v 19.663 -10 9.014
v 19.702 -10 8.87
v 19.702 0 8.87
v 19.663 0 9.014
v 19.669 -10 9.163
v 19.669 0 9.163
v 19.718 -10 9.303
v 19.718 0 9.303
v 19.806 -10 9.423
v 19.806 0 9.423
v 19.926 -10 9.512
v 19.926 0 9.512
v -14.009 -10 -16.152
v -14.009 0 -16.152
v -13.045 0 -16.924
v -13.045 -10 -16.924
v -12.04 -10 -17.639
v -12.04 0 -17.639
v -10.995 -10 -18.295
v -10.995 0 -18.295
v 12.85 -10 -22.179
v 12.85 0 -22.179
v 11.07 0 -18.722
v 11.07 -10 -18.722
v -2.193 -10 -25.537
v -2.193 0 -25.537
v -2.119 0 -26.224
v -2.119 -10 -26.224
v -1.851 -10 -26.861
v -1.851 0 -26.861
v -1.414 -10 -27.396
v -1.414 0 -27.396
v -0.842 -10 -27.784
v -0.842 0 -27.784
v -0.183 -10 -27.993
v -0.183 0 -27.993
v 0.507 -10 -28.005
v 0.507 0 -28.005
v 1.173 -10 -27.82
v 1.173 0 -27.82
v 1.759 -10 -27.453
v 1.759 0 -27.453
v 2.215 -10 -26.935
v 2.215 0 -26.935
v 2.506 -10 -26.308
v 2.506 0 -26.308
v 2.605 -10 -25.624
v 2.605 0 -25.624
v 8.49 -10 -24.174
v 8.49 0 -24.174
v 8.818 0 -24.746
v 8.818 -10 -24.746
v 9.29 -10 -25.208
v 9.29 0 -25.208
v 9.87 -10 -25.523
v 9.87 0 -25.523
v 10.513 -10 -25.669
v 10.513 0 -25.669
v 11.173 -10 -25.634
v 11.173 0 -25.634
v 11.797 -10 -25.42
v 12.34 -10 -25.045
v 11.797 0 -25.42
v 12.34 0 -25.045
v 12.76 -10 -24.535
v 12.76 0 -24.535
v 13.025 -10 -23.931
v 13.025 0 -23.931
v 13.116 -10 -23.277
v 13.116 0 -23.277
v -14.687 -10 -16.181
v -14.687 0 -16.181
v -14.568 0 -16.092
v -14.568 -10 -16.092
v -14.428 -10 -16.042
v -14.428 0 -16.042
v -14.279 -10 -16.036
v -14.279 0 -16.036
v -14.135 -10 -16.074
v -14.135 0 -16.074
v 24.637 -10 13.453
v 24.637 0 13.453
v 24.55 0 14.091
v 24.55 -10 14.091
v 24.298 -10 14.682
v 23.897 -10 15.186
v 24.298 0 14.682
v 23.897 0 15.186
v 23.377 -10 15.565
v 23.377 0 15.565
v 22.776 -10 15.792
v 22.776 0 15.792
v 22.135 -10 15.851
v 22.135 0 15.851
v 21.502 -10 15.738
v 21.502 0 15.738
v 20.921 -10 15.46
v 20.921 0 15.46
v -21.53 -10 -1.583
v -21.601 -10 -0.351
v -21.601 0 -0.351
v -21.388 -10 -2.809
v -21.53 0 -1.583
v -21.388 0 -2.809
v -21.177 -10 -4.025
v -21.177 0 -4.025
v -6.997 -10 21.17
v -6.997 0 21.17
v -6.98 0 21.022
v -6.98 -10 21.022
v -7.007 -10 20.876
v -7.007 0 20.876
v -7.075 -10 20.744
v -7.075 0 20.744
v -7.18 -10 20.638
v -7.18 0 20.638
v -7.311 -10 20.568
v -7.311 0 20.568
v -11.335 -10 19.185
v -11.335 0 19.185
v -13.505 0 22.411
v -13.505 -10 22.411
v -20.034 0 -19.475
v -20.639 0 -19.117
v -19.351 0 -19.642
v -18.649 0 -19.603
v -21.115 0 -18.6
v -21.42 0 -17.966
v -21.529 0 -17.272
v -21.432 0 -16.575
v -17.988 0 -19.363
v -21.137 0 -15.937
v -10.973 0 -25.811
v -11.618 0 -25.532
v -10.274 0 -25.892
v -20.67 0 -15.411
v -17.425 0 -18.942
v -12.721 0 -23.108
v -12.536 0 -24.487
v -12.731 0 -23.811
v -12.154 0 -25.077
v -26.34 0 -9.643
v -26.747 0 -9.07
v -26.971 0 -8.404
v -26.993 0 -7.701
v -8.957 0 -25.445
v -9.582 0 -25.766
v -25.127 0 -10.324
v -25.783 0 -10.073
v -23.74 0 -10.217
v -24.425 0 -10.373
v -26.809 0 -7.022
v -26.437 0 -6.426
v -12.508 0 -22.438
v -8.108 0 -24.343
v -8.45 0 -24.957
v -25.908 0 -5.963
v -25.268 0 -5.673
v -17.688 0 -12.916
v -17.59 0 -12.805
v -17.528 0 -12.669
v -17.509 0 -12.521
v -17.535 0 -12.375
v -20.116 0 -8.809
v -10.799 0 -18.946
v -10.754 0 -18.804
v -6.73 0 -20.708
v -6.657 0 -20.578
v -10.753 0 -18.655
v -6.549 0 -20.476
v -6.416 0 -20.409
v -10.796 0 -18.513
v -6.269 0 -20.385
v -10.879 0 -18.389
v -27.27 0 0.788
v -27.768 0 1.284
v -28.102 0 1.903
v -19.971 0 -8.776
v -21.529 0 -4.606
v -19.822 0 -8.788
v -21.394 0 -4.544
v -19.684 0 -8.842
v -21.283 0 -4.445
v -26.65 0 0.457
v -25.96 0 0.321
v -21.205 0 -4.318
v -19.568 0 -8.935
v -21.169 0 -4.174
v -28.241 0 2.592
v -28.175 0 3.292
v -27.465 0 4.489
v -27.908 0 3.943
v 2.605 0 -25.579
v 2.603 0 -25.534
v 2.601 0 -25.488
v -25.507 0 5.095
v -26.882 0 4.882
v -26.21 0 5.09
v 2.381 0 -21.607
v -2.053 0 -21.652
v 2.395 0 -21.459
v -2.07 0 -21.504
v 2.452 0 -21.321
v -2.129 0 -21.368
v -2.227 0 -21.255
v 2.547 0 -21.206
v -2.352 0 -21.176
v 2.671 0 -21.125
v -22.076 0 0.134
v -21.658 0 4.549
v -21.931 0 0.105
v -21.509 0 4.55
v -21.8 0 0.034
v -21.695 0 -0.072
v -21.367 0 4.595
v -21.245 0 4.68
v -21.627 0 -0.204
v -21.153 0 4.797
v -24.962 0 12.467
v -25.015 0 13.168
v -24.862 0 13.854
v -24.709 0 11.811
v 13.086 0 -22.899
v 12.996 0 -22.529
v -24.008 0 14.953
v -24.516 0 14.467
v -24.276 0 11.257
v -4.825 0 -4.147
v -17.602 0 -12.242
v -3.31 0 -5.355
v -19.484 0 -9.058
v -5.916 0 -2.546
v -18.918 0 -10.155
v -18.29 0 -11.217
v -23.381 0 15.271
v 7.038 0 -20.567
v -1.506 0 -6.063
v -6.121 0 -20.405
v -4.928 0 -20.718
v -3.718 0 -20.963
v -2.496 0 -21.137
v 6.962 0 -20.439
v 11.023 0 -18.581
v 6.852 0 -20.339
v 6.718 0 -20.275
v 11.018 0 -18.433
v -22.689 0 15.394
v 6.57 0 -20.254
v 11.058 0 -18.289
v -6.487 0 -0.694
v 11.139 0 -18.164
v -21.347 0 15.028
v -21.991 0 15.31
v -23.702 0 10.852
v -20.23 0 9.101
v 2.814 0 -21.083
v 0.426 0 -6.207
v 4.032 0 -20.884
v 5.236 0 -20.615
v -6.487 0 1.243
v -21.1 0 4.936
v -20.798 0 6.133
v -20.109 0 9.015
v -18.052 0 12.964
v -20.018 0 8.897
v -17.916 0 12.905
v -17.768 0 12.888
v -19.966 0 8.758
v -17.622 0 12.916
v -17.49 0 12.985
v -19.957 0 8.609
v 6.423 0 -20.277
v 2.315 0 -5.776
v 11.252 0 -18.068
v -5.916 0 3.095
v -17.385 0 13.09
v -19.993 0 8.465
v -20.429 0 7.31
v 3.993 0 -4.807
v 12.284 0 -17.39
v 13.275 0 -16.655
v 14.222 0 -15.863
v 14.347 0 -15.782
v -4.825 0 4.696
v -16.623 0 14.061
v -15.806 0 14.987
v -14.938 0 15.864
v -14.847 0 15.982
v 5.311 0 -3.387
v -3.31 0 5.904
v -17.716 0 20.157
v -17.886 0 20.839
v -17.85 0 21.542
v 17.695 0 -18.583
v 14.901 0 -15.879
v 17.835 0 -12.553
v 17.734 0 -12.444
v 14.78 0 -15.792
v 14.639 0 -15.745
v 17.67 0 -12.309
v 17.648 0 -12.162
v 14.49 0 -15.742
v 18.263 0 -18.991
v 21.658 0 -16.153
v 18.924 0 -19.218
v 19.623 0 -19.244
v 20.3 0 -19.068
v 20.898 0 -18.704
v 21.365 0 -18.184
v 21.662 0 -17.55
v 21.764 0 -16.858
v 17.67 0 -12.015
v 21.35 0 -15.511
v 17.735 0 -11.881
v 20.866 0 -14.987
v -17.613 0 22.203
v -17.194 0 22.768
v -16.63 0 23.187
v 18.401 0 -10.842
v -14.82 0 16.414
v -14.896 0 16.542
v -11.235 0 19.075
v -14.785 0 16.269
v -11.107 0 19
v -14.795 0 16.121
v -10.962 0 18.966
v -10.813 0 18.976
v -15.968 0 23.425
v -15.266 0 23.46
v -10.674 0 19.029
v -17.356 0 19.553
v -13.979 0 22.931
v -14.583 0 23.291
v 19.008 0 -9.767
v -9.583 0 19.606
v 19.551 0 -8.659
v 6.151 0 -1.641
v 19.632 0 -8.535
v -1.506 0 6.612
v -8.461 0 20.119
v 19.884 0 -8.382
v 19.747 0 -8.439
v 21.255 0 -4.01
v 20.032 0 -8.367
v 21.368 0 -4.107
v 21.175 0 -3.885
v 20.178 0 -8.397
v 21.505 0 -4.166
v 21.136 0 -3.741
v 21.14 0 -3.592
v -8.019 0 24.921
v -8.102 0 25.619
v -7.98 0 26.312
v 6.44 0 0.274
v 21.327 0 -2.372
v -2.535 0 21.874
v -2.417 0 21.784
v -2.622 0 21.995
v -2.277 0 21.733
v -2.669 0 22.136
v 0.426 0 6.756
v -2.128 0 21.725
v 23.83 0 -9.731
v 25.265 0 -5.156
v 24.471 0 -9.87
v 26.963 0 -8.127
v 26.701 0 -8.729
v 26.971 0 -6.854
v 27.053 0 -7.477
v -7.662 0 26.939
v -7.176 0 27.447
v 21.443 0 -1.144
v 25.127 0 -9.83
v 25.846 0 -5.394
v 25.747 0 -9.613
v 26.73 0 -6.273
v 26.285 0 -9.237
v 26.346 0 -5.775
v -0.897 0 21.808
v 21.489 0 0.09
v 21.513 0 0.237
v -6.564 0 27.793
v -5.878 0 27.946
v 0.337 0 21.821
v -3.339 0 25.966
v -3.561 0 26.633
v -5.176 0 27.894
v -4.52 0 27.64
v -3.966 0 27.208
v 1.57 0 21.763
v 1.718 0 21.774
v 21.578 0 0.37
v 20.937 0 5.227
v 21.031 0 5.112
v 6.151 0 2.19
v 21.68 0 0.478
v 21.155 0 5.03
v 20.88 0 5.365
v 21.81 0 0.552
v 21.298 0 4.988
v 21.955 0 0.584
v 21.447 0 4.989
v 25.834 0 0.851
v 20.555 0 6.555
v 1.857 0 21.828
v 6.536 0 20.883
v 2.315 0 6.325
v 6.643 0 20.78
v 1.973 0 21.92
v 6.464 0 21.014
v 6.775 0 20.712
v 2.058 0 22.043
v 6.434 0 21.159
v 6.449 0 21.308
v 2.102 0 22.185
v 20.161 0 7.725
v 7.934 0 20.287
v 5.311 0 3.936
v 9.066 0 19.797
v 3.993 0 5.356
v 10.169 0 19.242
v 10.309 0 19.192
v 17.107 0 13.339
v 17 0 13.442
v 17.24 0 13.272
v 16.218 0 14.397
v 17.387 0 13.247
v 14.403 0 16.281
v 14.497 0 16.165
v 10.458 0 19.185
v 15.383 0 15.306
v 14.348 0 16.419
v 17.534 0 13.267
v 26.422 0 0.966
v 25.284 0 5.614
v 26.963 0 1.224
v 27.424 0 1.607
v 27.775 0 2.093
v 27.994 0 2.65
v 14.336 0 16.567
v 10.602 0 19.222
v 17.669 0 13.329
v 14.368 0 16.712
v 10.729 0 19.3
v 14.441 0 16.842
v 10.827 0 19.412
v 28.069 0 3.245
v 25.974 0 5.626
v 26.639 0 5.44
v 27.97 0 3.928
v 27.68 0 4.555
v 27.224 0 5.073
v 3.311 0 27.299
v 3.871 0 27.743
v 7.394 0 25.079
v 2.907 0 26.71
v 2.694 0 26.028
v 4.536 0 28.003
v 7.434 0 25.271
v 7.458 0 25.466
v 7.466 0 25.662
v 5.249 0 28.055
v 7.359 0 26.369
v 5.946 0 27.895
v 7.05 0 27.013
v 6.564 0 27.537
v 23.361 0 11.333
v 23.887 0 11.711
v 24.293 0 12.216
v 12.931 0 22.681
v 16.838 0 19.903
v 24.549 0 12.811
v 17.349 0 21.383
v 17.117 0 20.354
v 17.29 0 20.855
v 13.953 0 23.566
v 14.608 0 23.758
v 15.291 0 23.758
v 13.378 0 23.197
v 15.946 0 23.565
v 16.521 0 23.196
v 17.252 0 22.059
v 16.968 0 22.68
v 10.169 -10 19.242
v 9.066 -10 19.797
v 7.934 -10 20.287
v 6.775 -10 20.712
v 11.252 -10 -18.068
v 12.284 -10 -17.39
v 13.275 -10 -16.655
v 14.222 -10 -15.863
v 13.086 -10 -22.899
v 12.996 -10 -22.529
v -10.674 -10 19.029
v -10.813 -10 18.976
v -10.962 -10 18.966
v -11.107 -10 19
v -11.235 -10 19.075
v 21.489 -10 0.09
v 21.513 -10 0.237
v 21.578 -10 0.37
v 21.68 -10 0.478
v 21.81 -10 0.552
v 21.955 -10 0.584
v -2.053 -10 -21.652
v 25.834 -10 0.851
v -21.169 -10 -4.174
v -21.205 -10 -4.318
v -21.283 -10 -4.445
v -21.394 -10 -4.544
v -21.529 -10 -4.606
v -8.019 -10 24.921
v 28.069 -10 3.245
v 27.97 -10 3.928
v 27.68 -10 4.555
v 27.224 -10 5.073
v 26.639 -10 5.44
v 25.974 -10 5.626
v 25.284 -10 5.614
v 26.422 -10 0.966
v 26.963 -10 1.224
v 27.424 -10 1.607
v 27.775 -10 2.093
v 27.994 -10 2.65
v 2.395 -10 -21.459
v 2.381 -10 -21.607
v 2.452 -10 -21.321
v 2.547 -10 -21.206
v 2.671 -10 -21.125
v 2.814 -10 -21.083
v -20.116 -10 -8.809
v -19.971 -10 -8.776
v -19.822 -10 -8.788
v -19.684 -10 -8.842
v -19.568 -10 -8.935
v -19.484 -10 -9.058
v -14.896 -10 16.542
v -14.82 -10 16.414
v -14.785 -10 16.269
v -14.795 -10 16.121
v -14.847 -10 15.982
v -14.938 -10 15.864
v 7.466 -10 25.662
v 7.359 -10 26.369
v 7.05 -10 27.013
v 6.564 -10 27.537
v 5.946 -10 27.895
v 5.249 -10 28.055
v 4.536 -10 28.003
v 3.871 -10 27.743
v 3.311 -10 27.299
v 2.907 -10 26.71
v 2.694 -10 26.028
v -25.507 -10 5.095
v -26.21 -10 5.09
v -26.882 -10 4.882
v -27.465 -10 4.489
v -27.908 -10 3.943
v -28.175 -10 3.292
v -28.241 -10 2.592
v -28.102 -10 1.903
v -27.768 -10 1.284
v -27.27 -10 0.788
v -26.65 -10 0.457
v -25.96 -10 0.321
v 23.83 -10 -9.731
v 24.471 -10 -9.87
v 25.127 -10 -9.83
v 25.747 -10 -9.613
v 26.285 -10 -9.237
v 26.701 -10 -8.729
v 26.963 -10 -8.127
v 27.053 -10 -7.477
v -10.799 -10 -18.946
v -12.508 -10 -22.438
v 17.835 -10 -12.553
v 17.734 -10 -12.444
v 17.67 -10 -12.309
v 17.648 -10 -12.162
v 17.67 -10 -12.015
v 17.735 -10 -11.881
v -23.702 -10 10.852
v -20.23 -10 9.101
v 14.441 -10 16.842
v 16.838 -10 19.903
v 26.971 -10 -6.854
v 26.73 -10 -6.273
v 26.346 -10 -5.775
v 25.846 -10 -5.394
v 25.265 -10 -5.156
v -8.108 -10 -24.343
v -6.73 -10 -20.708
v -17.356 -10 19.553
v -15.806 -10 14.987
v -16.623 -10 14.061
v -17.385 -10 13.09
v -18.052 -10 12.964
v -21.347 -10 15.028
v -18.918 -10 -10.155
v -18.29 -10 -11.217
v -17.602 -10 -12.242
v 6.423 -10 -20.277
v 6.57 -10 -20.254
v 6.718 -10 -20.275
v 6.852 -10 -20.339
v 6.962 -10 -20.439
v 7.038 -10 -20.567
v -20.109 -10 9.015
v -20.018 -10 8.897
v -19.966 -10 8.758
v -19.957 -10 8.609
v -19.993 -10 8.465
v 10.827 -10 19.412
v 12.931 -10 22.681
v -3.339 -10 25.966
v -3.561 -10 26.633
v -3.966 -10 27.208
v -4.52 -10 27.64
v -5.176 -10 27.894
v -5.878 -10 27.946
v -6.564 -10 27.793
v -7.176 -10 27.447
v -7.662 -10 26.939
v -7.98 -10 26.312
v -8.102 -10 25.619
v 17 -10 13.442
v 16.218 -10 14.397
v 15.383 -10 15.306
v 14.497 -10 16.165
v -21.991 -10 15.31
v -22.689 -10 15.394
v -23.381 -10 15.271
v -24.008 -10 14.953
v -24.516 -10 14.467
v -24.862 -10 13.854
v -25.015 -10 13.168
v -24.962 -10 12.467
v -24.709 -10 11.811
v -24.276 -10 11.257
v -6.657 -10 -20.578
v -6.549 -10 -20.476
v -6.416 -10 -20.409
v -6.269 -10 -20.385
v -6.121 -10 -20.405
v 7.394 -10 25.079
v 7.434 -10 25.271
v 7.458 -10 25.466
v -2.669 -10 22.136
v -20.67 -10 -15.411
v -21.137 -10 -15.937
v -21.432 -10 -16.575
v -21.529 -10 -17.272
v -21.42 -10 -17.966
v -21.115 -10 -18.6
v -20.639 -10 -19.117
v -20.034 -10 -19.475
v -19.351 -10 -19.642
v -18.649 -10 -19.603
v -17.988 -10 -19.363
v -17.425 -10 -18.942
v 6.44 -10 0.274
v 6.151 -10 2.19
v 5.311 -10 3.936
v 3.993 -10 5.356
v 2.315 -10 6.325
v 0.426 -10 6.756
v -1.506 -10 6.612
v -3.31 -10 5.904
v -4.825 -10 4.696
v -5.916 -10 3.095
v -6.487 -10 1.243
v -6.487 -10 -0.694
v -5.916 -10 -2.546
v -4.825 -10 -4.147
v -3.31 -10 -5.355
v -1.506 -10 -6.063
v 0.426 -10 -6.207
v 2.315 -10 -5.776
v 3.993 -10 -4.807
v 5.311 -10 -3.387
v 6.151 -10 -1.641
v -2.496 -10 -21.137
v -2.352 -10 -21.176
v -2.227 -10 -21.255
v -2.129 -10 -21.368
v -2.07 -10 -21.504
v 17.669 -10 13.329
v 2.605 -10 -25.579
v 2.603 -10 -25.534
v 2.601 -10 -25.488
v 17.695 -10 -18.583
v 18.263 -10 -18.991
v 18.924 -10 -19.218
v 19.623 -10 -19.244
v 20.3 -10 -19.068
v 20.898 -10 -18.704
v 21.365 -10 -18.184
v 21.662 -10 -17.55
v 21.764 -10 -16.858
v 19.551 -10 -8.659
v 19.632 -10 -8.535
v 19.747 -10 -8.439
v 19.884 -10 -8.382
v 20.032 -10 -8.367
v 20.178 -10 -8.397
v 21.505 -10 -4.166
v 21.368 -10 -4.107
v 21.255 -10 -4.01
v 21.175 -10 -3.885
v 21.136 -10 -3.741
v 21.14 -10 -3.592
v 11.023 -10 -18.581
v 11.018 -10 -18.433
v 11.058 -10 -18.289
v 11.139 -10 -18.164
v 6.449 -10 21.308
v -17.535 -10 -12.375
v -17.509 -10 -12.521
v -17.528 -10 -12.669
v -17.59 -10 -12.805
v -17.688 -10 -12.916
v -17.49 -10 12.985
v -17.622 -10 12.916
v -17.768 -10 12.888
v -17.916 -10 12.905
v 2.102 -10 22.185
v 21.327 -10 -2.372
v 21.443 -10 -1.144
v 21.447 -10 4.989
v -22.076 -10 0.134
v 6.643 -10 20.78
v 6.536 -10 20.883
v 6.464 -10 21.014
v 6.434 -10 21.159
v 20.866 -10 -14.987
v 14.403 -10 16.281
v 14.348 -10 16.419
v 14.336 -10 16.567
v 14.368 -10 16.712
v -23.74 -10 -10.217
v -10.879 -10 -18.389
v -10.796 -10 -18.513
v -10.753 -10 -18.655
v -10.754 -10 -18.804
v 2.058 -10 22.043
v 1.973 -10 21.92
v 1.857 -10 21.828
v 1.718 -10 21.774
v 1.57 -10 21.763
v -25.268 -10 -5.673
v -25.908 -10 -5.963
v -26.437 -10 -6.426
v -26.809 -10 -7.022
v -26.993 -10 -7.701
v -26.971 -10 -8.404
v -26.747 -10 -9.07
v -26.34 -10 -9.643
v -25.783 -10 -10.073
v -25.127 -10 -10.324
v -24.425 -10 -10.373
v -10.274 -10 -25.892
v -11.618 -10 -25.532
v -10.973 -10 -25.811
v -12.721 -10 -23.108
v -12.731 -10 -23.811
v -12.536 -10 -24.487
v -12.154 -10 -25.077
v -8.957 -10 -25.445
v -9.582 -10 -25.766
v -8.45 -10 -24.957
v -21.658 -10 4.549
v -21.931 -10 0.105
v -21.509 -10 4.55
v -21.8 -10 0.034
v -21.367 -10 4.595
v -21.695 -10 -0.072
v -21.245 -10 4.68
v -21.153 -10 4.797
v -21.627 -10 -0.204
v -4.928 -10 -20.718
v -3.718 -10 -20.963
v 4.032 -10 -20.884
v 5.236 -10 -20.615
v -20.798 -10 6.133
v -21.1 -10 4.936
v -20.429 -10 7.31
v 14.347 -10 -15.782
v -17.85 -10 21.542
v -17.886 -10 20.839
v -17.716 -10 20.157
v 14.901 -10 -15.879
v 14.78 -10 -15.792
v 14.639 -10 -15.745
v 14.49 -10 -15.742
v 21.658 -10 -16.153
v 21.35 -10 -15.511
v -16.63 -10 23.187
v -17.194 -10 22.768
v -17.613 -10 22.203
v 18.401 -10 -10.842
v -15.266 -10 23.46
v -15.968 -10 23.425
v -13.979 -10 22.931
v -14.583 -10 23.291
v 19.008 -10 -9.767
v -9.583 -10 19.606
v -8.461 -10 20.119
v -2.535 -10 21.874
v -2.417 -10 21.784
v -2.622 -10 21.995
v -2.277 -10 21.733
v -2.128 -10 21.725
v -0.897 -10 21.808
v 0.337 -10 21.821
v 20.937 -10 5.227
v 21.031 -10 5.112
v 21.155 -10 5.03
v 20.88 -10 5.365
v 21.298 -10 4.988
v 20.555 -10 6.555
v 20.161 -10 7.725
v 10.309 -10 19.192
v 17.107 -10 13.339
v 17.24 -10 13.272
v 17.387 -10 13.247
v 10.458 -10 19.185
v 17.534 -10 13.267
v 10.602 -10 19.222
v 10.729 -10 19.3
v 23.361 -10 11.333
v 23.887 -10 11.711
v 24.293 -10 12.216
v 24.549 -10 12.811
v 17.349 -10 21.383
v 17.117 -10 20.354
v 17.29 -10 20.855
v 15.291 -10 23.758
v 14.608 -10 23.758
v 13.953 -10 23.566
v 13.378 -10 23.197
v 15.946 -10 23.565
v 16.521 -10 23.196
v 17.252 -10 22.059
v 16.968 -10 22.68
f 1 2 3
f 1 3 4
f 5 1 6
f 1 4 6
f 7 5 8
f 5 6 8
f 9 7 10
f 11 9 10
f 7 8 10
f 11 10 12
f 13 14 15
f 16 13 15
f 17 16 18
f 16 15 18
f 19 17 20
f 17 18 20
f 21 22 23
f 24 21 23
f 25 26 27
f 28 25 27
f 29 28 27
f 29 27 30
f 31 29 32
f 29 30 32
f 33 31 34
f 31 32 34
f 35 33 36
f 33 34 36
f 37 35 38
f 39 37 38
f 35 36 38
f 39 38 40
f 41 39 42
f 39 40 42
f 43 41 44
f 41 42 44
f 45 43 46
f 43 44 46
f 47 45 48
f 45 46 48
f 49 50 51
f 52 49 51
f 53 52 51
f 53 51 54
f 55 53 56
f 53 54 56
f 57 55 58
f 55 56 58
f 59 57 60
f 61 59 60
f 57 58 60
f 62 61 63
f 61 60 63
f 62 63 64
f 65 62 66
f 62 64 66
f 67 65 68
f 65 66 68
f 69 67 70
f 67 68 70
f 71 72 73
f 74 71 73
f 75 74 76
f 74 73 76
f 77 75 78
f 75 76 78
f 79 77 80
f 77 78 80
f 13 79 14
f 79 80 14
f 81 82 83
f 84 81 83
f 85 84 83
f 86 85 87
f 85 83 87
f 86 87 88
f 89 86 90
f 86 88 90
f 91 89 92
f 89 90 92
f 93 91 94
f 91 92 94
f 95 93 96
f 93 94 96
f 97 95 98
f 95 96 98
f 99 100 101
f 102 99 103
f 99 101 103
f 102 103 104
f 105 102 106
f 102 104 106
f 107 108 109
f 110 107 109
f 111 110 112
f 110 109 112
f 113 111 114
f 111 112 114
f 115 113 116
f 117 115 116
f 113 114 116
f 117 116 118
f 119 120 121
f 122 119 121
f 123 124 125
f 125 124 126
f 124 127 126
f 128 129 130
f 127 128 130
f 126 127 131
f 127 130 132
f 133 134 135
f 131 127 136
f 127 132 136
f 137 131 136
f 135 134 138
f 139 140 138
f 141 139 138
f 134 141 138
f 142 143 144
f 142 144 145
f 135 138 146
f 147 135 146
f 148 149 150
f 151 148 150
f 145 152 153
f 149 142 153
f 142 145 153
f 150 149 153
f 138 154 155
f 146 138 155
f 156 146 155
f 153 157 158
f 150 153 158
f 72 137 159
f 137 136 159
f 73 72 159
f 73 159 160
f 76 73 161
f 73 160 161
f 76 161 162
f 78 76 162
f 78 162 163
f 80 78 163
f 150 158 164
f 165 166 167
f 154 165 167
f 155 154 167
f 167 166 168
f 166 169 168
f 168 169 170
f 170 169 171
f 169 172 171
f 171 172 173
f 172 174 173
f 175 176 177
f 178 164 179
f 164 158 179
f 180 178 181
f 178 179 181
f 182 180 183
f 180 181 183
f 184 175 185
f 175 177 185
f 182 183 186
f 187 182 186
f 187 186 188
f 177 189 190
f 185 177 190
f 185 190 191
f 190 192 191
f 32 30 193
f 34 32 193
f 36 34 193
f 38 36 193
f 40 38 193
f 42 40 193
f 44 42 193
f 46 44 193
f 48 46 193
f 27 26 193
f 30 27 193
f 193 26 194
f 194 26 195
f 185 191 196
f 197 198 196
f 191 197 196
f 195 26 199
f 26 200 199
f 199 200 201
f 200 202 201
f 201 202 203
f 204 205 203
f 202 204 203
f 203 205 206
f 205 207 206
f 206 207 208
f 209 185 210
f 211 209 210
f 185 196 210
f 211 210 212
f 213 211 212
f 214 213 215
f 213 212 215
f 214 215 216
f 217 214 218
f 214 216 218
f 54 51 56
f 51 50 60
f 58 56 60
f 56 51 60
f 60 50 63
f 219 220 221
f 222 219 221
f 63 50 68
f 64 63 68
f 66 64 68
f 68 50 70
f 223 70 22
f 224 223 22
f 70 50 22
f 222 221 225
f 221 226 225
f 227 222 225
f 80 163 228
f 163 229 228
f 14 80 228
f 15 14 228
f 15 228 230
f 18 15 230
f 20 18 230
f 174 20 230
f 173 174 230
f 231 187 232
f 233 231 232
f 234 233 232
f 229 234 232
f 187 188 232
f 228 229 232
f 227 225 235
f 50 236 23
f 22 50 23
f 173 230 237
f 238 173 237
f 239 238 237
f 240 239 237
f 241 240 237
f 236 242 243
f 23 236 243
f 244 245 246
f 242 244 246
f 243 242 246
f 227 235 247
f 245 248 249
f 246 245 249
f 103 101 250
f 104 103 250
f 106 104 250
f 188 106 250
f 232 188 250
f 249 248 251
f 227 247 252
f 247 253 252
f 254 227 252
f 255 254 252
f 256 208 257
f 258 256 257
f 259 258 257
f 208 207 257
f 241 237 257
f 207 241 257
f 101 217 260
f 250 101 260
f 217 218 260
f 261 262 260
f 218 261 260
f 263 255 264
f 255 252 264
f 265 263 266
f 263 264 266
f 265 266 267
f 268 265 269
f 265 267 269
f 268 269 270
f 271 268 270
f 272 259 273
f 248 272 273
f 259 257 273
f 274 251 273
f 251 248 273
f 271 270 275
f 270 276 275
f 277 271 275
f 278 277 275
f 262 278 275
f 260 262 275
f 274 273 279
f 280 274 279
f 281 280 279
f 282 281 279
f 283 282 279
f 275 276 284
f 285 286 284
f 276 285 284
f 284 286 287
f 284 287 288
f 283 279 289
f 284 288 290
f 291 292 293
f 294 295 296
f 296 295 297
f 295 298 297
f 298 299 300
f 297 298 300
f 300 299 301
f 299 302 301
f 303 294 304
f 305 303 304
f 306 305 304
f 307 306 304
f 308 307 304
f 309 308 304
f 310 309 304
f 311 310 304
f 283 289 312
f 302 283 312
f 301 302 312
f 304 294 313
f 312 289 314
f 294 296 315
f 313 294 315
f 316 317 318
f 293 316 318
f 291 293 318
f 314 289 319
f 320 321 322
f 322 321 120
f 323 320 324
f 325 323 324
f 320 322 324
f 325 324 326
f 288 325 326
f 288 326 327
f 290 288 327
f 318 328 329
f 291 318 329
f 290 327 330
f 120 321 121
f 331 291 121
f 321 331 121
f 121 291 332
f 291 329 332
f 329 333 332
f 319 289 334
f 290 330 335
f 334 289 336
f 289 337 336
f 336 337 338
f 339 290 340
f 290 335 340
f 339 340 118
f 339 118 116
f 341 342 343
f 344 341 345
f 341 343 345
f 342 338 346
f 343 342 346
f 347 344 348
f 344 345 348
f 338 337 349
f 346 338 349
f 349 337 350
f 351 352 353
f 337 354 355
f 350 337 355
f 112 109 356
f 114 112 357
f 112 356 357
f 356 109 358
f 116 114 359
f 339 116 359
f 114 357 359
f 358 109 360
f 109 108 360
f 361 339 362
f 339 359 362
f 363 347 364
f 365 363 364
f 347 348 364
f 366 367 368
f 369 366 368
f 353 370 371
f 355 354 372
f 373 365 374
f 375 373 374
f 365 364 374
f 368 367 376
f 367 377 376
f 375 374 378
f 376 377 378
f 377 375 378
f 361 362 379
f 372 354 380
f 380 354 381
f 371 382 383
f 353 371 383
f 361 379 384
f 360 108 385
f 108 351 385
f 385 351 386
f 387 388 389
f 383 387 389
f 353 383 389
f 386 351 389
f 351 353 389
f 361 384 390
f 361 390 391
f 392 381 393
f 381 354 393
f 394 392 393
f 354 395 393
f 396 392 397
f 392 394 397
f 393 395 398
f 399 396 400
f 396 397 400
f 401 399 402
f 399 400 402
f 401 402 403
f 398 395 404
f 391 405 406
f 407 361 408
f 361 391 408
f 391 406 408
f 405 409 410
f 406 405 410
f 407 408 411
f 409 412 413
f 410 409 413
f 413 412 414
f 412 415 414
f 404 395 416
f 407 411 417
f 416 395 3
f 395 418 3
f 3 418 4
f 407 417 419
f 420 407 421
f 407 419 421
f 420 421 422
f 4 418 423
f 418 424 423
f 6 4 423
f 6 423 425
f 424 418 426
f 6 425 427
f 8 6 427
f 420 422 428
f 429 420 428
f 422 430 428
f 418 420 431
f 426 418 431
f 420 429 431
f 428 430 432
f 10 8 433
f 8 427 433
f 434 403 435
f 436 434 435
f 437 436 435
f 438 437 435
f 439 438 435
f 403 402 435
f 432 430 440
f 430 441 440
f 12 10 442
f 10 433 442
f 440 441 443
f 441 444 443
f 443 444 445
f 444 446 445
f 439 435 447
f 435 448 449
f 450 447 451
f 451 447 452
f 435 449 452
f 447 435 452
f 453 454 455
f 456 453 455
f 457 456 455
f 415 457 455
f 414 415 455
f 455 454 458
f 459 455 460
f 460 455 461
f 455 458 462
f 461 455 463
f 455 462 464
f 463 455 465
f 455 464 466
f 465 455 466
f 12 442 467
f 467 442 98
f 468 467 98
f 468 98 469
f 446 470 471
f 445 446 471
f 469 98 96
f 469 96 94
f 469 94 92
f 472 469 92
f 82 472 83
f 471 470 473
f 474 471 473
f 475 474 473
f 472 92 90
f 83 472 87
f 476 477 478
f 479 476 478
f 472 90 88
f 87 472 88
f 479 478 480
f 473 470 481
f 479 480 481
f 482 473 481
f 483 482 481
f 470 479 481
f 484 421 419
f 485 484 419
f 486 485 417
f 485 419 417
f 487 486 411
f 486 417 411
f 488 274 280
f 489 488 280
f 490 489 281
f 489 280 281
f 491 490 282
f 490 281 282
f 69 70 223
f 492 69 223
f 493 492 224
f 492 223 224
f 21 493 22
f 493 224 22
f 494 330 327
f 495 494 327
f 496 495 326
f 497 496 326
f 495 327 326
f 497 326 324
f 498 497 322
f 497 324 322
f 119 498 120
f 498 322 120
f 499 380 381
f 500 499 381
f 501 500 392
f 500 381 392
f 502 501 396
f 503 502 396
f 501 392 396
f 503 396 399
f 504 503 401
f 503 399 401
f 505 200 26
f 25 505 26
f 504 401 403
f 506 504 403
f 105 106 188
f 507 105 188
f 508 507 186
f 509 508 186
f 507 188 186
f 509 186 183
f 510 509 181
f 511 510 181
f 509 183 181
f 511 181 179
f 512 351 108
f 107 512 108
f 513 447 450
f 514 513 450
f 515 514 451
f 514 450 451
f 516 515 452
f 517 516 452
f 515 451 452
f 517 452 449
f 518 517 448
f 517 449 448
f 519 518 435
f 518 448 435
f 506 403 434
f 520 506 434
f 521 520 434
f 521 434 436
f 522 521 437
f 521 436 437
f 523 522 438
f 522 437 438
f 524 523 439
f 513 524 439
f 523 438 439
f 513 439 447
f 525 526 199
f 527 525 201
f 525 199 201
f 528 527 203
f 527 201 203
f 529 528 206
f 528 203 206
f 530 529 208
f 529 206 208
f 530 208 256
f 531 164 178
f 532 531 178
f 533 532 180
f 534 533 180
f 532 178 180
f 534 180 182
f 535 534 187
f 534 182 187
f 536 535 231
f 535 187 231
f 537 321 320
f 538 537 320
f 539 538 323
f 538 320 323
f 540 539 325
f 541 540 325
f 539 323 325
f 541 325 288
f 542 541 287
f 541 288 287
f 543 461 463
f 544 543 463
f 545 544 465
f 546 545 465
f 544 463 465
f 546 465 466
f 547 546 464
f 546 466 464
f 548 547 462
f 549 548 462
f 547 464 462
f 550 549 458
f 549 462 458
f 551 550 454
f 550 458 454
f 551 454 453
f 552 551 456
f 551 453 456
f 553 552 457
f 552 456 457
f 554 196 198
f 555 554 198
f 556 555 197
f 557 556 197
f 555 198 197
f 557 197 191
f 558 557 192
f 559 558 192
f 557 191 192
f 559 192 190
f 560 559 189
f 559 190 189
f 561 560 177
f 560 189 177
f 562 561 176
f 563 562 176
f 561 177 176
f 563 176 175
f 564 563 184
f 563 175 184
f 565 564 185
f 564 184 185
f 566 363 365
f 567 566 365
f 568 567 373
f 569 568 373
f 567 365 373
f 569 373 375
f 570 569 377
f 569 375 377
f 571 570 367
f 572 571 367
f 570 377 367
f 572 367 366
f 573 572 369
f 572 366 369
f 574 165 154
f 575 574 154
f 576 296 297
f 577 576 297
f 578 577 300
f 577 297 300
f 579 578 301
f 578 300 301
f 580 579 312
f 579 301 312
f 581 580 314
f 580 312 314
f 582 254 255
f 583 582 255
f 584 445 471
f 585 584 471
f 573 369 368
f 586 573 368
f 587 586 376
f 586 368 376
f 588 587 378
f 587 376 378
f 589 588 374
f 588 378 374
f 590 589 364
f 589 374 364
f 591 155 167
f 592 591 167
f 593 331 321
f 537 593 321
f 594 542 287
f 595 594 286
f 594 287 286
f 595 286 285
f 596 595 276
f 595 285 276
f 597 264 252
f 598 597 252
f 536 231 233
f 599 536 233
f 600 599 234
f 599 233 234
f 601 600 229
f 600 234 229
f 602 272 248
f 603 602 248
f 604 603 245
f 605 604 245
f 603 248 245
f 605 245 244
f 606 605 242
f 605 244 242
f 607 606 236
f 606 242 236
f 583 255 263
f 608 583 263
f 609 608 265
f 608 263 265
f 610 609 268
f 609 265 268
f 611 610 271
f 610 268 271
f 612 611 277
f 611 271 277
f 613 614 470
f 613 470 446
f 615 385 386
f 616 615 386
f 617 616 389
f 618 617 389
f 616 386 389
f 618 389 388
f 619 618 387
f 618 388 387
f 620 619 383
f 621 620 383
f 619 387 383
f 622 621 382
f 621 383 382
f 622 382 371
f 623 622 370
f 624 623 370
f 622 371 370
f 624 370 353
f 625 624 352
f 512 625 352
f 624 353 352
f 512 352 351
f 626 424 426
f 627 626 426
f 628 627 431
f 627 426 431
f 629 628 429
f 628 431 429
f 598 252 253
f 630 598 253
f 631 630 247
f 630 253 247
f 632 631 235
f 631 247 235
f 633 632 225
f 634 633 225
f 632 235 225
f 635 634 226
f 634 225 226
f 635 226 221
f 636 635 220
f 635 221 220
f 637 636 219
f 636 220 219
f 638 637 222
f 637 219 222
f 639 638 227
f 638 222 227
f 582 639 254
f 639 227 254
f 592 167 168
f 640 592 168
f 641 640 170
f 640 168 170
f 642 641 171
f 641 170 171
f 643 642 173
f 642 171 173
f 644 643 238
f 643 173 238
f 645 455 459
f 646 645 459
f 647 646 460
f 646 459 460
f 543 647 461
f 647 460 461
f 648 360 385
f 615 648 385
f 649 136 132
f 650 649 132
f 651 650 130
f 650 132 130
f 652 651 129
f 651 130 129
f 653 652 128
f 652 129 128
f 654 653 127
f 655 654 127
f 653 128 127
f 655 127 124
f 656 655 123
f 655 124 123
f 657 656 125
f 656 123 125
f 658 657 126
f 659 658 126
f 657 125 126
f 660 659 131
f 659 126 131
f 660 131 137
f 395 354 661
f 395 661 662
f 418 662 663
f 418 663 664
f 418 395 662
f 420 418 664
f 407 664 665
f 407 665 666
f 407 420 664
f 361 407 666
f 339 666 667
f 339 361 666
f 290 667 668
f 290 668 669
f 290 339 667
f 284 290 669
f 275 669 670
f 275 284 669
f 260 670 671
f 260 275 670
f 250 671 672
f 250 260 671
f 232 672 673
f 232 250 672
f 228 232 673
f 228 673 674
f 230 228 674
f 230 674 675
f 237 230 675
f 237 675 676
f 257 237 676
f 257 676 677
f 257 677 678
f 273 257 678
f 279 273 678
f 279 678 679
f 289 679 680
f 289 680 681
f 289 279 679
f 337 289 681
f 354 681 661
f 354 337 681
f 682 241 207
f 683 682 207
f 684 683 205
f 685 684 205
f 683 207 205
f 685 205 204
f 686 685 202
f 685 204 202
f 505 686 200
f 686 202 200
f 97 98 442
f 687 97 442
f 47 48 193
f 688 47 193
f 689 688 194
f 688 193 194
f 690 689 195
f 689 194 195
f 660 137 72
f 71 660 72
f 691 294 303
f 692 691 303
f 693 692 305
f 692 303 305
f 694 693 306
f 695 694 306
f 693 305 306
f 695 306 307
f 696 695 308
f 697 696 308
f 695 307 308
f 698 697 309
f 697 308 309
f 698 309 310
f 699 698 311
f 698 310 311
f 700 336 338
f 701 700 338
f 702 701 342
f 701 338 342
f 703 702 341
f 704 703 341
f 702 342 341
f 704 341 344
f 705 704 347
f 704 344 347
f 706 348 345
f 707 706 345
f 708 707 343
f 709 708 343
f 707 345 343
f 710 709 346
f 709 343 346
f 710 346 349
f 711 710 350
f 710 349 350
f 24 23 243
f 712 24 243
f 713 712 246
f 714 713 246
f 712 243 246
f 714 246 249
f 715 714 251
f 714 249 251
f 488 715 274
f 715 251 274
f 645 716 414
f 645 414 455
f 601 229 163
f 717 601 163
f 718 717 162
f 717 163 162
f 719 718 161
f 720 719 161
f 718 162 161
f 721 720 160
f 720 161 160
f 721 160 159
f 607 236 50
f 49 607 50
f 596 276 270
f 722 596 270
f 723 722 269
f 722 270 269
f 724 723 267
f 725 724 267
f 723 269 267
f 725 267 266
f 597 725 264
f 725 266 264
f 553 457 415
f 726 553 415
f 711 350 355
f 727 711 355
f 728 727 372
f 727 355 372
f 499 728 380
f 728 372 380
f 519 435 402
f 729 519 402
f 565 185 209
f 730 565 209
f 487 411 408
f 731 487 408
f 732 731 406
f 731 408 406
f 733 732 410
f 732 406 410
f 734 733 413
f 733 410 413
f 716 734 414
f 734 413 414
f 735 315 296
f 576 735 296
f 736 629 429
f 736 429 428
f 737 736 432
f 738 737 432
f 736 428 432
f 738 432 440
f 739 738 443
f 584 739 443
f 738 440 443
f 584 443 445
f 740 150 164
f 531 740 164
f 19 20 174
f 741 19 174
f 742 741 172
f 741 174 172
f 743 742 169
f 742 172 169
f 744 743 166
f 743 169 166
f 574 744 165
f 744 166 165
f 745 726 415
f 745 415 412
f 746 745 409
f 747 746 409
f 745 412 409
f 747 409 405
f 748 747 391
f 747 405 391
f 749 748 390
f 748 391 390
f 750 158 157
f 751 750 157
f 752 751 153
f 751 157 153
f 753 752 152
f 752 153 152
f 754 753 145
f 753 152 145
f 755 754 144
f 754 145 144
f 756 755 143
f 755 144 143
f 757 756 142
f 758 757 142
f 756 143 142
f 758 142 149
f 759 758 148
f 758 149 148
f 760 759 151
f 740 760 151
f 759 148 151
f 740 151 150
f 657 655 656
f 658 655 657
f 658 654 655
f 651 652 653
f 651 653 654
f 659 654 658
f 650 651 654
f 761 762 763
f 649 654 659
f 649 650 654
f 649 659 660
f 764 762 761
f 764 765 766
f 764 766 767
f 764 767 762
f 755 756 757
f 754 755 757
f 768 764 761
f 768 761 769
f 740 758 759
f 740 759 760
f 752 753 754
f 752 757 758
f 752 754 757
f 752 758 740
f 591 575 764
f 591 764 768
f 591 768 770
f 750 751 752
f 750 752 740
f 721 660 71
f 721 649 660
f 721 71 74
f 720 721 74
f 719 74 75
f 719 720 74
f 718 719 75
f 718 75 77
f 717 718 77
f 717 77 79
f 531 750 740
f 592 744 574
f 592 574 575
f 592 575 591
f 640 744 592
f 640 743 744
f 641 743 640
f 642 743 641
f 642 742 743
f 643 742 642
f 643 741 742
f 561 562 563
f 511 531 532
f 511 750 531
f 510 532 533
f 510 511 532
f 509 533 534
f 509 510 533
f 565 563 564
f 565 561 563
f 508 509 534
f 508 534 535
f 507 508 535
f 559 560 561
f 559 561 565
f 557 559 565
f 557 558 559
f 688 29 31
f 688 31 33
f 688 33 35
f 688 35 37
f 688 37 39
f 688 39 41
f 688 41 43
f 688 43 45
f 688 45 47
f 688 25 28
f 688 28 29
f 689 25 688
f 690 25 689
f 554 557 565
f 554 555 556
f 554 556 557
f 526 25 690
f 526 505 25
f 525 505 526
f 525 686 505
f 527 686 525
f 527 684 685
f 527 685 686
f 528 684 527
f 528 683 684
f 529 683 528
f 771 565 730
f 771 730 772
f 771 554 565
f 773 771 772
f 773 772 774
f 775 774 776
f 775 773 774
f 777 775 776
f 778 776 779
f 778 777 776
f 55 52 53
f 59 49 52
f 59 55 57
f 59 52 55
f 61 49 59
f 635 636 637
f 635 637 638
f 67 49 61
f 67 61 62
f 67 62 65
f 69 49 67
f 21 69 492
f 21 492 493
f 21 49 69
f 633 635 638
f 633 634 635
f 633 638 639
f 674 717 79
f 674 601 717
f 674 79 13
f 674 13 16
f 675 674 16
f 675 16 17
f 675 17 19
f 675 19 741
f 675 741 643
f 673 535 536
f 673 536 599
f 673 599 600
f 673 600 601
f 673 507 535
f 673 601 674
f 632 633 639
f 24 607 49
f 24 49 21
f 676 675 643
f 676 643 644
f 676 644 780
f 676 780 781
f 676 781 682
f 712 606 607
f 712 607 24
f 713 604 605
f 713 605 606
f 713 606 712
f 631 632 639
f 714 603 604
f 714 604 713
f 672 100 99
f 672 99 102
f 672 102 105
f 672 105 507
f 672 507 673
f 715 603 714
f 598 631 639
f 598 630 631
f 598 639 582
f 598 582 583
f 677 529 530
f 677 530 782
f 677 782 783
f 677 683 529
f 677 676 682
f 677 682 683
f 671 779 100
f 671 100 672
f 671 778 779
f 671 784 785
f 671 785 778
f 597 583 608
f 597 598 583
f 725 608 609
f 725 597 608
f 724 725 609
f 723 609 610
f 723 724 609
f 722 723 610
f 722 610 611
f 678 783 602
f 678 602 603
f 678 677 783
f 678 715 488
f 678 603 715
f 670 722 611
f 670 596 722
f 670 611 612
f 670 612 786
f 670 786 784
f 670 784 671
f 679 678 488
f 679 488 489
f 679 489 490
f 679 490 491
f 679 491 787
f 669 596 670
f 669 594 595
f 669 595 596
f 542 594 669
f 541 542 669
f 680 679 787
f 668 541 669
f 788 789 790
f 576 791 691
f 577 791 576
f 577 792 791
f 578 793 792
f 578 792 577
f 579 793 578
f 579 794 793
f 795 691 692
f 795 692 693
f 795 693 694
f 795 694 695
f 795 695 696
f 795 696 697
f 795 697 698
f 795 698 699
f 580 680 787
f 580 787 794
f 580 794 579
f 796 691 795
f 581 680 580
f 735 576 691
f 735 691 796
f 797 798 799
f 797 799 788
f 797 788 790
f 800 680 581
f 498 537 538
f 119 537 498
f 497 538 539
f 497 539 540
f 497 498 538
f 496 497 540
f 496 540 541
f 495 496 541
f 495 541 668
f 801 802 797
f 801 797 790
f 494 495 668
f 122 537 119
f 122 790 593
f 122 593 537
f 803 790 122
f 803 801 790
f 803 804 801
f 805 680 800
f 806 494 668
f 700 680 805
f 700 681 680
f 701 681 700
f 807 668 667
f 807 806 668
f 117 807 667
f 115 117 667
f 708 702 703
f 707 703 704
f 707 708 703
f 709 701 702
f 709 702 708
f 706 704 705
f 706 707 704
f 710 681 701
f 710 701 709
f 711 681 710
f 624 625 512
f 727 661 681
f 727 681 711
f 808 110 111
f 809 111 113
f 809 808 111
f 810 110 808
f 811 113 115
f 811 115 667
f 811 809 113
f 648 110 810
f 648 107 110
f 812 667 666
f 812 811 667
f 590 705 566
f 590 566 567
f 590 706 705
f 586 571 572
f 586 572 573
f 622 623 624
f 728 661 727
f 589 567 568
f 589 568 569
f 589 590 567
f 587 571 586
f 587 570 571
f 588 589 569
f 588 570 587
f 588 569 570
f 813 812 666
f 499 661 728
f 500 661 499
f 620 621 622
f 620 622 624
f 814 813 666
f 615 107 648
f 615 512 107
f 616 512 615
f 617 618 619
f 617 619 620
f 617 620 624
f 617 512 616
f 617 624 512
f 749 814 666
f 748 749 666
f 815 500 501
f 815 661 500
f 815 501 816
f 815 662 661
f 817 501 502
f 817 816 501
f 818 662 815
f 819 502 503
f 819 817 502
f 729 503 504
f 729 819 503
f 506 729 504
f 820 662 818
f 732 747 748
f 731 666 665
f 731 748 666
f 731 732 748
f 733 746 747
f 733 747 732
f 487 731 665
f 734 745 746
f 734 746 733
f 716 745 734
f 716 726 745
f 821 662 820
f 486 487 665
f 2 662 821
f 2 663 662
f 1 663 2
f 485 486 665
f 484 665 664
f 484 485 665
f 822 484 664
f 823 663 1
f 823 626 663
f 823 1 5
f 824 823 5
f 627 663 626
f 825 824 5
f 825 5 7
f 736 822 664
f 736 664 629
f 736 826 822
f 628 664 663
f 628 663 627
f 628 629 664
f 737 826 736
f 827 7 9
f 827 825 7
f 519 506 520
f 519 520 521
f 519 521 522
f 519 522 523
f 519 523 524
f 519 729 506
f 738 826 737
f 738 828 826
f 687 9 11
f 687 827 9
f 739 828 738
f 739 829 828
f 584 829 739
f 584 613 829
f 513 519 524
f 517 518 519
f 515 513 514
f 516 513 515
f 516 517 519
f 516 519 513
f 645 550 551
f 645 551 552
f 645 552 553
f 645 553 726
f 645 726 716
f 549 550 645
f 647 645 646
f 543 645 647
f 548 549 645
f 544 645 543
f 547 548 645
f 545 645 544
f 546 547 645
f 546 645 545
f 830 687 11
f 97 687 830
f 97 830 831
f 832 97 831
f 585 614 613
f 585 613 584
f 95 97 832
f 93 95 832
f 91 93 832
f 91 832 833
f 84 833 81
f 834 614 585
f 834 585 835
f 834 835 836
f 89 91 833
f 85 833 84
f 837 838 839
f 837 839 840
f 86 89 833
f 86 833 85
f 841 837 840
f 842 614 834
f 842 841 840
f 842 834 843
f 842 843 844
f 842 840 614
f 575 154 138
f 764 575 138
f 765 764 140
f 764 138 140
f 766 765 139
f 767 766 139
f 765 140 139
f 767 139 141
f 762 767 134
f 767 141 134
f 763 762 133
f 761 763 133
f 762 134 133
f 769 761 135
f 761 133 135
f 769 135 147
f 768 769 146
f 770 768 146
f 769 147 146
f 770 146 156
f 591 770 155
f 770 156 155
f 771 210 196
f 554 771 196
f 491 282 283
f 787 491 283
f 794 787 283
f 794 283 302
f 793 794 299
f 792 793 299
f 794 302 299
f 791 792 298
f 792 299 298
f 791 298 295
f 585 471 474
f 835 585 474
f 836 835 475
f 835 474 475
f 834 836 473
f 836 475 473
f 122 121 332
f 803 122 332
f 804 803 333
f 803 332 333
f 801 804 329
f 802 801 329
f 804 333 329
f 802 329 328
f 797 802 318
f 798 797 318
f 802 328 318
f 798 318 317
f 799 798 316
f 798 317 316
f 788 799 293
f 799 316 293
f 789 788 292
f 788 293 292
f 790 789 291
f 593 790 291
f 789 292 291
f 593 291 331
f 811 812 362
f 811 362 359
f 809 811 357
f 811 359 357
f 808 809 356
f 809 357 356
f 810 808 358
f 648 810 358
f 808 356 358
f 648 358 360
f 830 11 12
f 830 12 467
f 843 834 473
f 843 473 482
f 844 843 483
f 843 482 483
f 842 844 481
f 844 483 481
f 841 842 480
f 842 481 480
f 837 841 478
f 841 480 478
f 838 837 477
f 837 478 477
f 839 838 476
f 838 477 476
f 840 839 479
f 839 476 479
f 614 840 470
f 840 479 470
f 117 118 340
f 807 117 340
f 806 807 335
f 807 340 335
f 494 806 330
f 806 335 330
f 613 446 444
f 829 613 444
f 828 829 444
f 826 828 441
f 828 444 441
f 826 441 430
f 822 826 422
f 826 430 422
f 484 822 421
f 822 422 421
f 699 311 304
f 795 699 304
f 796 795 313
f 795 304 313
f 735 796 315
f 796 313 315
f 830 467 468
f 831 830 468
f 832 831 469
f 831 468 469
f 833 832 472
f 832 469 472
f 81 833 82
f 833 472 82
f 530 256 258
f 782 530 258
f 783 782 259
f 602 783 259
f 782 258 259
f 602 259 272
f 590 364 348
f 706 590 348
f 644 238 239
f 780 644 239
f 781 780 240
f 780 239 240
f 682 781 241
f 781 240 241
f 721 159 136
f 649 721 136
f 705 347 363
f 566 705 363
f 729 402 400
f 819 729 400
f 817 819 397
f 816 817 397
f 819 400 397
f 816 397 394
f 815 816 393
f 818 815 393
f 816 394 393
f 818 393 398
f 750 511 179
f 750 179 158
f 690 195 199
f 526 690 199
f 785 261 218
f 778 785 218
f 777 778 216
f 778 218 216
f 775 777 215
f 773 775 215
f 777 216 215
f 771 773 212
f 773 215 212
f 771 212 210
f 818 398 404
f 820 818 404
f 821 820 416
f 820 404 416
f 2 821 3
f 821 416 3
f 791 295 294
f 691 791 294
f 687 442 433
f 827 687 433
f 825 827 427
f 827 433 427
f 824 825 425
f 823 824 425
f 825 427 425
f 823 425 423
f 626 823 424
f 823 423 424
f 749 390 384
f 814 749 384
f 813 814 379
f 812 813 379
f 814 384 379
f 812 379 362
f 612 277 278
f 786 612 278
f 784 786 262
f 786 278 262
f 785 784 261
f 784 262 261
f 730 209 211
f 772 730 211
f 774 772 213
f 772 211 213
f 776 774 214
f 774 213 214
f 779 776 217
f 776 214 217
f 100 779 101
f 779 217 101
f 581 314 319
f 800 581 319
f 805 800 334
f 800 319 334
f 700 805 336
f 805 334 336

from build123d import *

# Parameters (mm, degrees)
F0_R     = 6.5
F1_DEPTH = 10


with BuildPart() as f1:
    # F0 (on Front) → F1 (new body)
    with BuildSketch(Plane.XZ):
        with BuildLine():
            ThreePointArc((21.489422, 0.089595), (21.490017, 0.182046), (21.490216, 0.274498))
            ThreePointArc((21.490216, 0.274498), (21.337215, 2.837876), (20.880386, 5.364856))
            ThreePointArc((20.880386, 5.364856), (20.366338, 7.142979), (19.701602, 8.870433))
            ThreePointArc((19.701602, 8.870433), (18.49194, 11.239716), (16.999578, 13.441906))
            ThreePointArc((16.999578, 13.441906), (15.806743, 14.85722), (14.496859, 16.164955))
            ThreePointArc((14.496859, 16.164955), (12.428103, 17.837389), (10.169051, 19.242192))
            ThreePointArc((10.169051, 19.242192), (8.503682, 20.049976), (6.77514, 20.711873))
            ThreePointArc((6.77514, 20.711873), (4.204997, 21.398279), (1.569866, 21.762791))
            ThreePointArc((1.569866, 21.762791), (-0.28008, 21.823372), (-2.1284, 21.724983))
            ThreePointArc((-2.1284, 21.724983), (-4.755529, 21.306675), (-7.311101, 20.567869))
            ThreePointArc((-7.311101, 20.567869), (-9.025751, 19.870772), (-10.674257, 19.02911))
            ThreePointArc((-10.674257, 19.02911), (-12.904117, 17.578417), (-14.938249, 15.864039))
            ThreePointArc((-14.938249, 15.864039), (-16.221125, 14.529798), (-17.384776, 13.090393))
            ThreePointArc((-17.384776, 13.090393), (-18.831804, 10.858154), (-19.992776, 8.464635))
            ThreePointArc((-19.992776, 8.464635), (-20.622056, 6.723953), (-21.099646, 4.935692))
            ThreePointArc((-21.099646, 4.935692), (-21.513639, 2.30788), (-21.600707, -0.350918))
            ThreePointArc((-21.600707, -0.350918), (-21.467584, -2.197061), (-21.176533, -4.024972))
            ThreePointArc((-21.176533, -4.024972), (-20.485906, -6.593984), (-19.484017, -9.05833))
            ThreePointArc((-19.484017, -9.05833), (-18.611509, -10.69072), (-17.602142, -12.242219))
            ThreePointArc((-17.602142, -12.242219), (-15.926312, -14.308225), (-14.008701, -16.152012))
            ThreePointArc((-14.008701, -16.152012), (-12.547672, -17.288394), (-10.994518, -18.295211))
            ThreePointArc((-10.994518, -18.295211), (-8.623251, -19.50098), (-6.12149, -20.405401))
            ThreePointArc((-6.12149, -20.405401), (-4.324566, -20.849283), (-2.49618, -21.137332))
            ThreePointArc((-2.49618, -21.137332), (0.160511, -21.274376), (2.813844, -21.083048))
            ThreePointArc((2.813844, -21.083048), (4.63596, -20.75768), (6.423434, -20.277154))
            ThreePointArc((6.423434, -20.277154), (8.906182, -19.321776), (11.252303, -18.067781))
            ThreePointArc((11.252303, -18.067781), (12.784549, -17.029421), (14.22204, -15.863408))
            ThreePointArc((14.22204, -15.863408), (16.101556, -13.980802), (17.734798, -11.880967))
            ThreePointArc((17.734798, -11.880967), (18.712236, -10.309158), (19.551189, -8.659271))
            ThreePointArc((19.551189, -8.659271), (20.502488, -6.174957), (21.140449, -3.592363))
            ThreePointArc((21.140449, -3.592363), (21.39407, -1.758884), (21.489422, 0.089595))
        make_face()
        with Locations((-0.059784, 0.274498)):
            Circle(F0_R, mode=Mode.SUBTRACT)
        with BuildLine():
            ThreePointArc((20.880386, 5.364856), (21.337215, 2.837876), (21.490216, 0.274498))
            ThreePointArc((21.490216, 0.274498), (21.490017, 0.182046), (21.489422, 0.089595))
            ThreePointArc((21.489422, 0.089595), (21.625402, 0.428092), (21.955134, 0.584129))
            Line((21.955134, 0.584129), (25.833808, 0.8506))
            ThreePointArc((25.833808, 0.8506), (23.285148, 2.969702), (25.283889, 5.613806))
            Line((25.283889, 5.613806), (21.446534, 4.989451))
            ThreePointArc((21.446534, 4.989451), (21.089921, 5.066249), (20.880386, 5.364856))
        make_face()
        with BuildLine():
            ThreePointArc((16.999578, 13.441906), (18.49194, 11.239716), (19.701602, 8.870433))
            ThreePointArc((19.701602, 8.870433), (19.688147, 9.234973), (19.925906, 9.511634))
            Line((19.925906, 9.511634), (23.360867, 11.332666))
            ThreePointArc((23.360867, 11.332666), (20.170635, 12.231929), (20.921121, 15.4604))
            Line((20.921121, 15.4604), (17.66947, 13.32923))
            ThreePointArc((17.66947, 13.32923), (17.312452, 13.254341), (16.999578, 13.441906))
        make_face()
        with BuildLine():
            ThreePointArc((21.504959, -4.165585), (21.210414, -3.950379), (21.140449, -3.592363))
            ThreePointArc((21.140449, -3.592363), (20.502488, -6.174957), (19.551189, -8.659271))
            ThreePointArc((19.551189, -8.659271), (19.813092, -8.405347), (20.177783, -8.396914))
            Line((20.177783, -8.396914), (23.829511, -9.731079))
            ThreePointArc((23.829511, -9.731079), (22.363111, -6.75855), (25.264506, -5.156002))
            Line((25.264506, -5.156002), (21.504959, -4.165585))
        make_face()
        with BuildLine():
            ThreePointArc((28.069311, 3.244956), (27.22414, 5.073209), (25.283889, 5.613806))
            ThreePointArc((25.283889, 5.613806), (23.285148, 2.969702), (25.833808, 0.8506))
            ThreePointArc((25.833808, 0.8506), (27.423562, 1.607091), (28.069311, 3.244956))
        make_face()
        with BuildLine():
            ThreePointArc((10.169051, 19.242192), (12.428103, 17.837389), (14.496859, 16.164955))
            ThreePointArc((14.496859, 16.164955), (14.336295, 16.492507), (14.44097, 16.841954))
            Line((14.44097, 16.841954), (16.838283, 19.902675))
            ThreePointArc((16.838283, 19.902675), (13.558098, 19.426607), (12.930564, 22.681212))
            Line((12.930564, 22.681212), (10.826858, 19.411727))
            ThreePointArc((10.826858, 19.411727), (10.531165, 19.198099), (10.169051, 19.242192))
        make_face()
        with BuildLine():
            ThreePointArc((20.921121, 15.4604), (20.170635, 12.231929), (23.360867, 11.332666))
            ThreePointArc((23.360867, 11.332666), (24.293167, 12.215768), (24.63672, 13.453113))
            ThreePointArc((24.63672, 13.453113), (23.377457, 15.564681), (20.921121, 15.4604))
        make_face()
        with BuildLine():
            ThreePointArc((17.834645, -12.552891), (17.653096, -12.236488), (17.734798, -11.880967))
            ThreePointArc((17.734798, -11.880967), (16.101556, -13.980802), (14.22204, -15.863408))
            ThreePointArc((14.22204, -15.863408), (14.56458, -15.737962), (14.901172, -15.878591))
            Line((14.901172, -15.878591), (17.694538, -18.582703))
            ThreePointArc((17.694538, -18.582703), (17.563951, -15.270725), (20.866323, -14.986827))
            Line((20.866323, -14.986827), (17.834645, -12.552891))
        make_face()
        with BuildLine():
            ThreePointArc((27.053109, -7.476819), (26.554076, -6.011786), (25.264506, -5.156002))
            ThreePointArc((25.264506, -5.156002), (22.363111, -6.75855), (23.829511, -9.731079))
            ThreePointArc((23.829511, -9.731079), (26.028493, -9.443623), (27.053109, -7.476819))
        make_face()
        with BuildLine():
            ThreePointArc((1.569866, 21.762791), (4.204997, 21.398279), (6.77514, 20.711873))
            ThreePointArc((6.77514, 20.711873), (6.49523, 20.945799), (6.448722, 21.307611))
            Line((6.448722, 21.307611), (7.393869, 25.078793))
            ThreePointArc((7.393869, 25.078793), (4.590905, 23.309712), (2.693857, 26.027701))
            Line((2.693857, 26.027701), (2.101846, 22.185223))
            ThreePointArc((2.101846, 22.185223), (1.918607, 21.869795), (1.569866, 21.762791))
        make_face()
        with BuildLine():
            ThreePointArc((12.930564, 22.681212), (13.558098, 19.426607), (16.838283, 19.902675))
            ThreePointArc((16.838283, 19.902675), (17.217628, 20.59982), (17.34886, 21.382567))
            ThreePointArc((17.34886, 21.382567), (15.62565, 23.685165), (12.930564, 22.681212))
        make_face()
        with BuildLine():
            ThreePointArc((11.070221, -18.722225), (11.03306, -18.359334), (11.252303, -18.067781))
            ThreePointArc((11.252303, -18.067781), (8.906182, -19.321776), (6.423434, -20.277154))
            ThreePointArc((6.423434, -20.277154), (6.787383, -20.301877), (7.037676, -20.567252))
            Line((7.037676, -20.567252), (8.489682, -24.173746))
            ThreePointArc((8.489682, -24.173746), (9.717488, -21.094989), (12.849825, -22.178831))
            Line((12.849825, -22.178831), (11.070221, -18.722225))
        make_face()
        with BuildLine():
            ThreePointArc((21.763822, -16.858322), (21.527846, -15.820536), (20.866323, -14.986827))
            ThreePointArc((20.866323, -14.986827), (17.563951, -15.270725), (17.694538, -18.582703))
            ThreePointArc((17.694538, -18.582703), (20.30023, -19.068105), (21.763822, -16.858322))
        make_face()
        with BuildLine():
            ThreePointArc((-7.311101, 20.567869), (-4.755529, 21.306675), (-2.1284, 21.724983))
            ThreePointArc((-2.1284, 21.724983), (-2.479256, 21.824836), (-2.668905, 22.136451))
            Line((-2.668905, 22.136451), (-3.339348, 25.966023))
            ThreePointArc((-3.339348, 25.966023), (-3.312399, 25.759866), (-3.303393, 25.55215))
            ThreePointArc((-3.303393, 25.55215), (-5.385121, 23.173347), (-8.018979, 24.921226))
            Line((-8.018979, 24.921226), (-6.996931, 21.170155))
            ThreePointArc((-6.996931, 21.170155), (-7.036032, 20.807468), (-7.311101, 20.567869))
        make_face()
        with BuildLine():
            ThreePointArc((2.693857, 26.027701), (4.590905, 23.309712), (7.393869, 25.078793))
            ThreePointArc((7.393869, 25.078793), (7.447801, 25.368306), (7.465869, 25.662244))
            ThreePointArc((7.465869, 25.662244), (5.249133, 28.055237), (2.693857, 26.027701))
        make_face()
        with BuildLine():
            ThreePointArc((2.381318, -21.606853), (2.494971, -21.260221), (2.813844, -21.083048))
            ThreePointArc((2.813844, -21.083048), (0.160511, -21.274376), (-2.49618, -21.137332))
            ThreePointArc((-2.49618, -21.137332), (-2.173751, -21.30795), (-2.053035, -21.652186))
            Line((-2.053035, -21.652186), (-2.193455, -25.537465))
            ThreePointArc((-2.193455, -25.537465), (0.180445, -23.224274), (2.60114, -25.48845))
            Line((2.60114, -25.48845), (2.381318, -21.606853))
        make_face()
        with BuildLine():
            ThreePointArc((13.116017, -23.277404), (13.04852, -22.712223), (12.849825, -22.178831))
            ThreePointArc((12.849825, -22.178831), (9.717488, -21.094989), (8.489682, -24.173746))
            ThreePointArc((8.489682, -24.173746), (11.172523, -25.633588), (13.116017, -23.277404))
        make_face()
        with BuildLine():
            ThreePointArc((-14.938249, 15.864039), (-12.904117, 17.578417), (-10.674257, 19.02911))
            ThreePointArc((-10.674257, 19.02911), (-11.035394, 18.977623), (-11.335392, 19.185161))
            Line((-11.335392, 19.185161), (-13.5055, 22.410955))
            ThreePointArc((-13.5055, 22.410955), (-13.201266, 21.771612), (-13.096825, 21.071319))
            ThreePointArc((-13.096825, 21.071319), (-14.690926, 18.810672), (-17.355598, 19.553109))
            Line((-17.355598, 19.553109), (-14.896213, 16.542039))
            ThreePointArc((-14.896213, 16.542039), (-14.784416, 16.194804), (-14.938249, 15.864039))
        make_face()
        with BuildLine():
            ThreePointArc((-3.303393, 25.55215), (-3.312399, 25.759866), (-3.339348, 25.966023))
            ThreePointArc((-3.339348, 25.966023), (-6.226353, 27.89448), (-8.018979, 24.921226))
            ThreePointArc((-8.018979, 24.921226), (-5.385121, 23.173347), (-3.303393, 25.55215))
        make_face()
        with BuildLine():
            ThreePointArc((-6.729674, -20.707997), (-6.484858, -20.43756), (-6.12149, -20.405401))
            ThreePointArc((-6.12149, -20.405401), (-8.623251, -19.50098), (-10.994518, -18.295211))
            ThreePointArc((-10.994518, -18.295211), (-10.769361, -18.582222), (-10.799095, -18.945796))
            Line((-10.799095, -18.945796), (-12.507661, -22.438062))
            ThreePointArc((-12.507661, -22.438062), (-9.810532, -21.154624), (-7.95184, -23.492782))
            ThreePointArc((-7.95184, -23.492782), (-7.991112, -23.925177), (-8.107644, -24.343421))
            Line((-8.107644, -24.343421), (-6.729674, -20.707997))
        make_face()
        with BuildLine():
            ThreePointArc((2.604979, -25.624149), (2.604019, -25.556272), (2.60114, -25.48845))
            ThreePointArc((2.60114, -25.48845), (0.180445, -23.224274), (-2.193455, -25.537465))
            ThreePointArc((-2.193455, -25.537465), (0.16163, -28.023757), (2.604979, -25.624149))
        make_face()
        with BuildLine():
            ThreePointArc((-19.992776, 8.464635), (-18.831804, 10.858154), (-17.384776, 13.090393))
            ThreePointArc((-17.384776, 13.090393), (-17.693749, 12.896471), (-18.052224, 12.964045))
            Line((-18.052224, 12.964045), (-21.346765, 15.028293))
            ThreePointArc((-21.346765, 15.028293), (-20.521256, 14.156793), (-20.221052, 12.994529))
            ThreePointArc((-20.221052, 12.994529), (-21.362749, 10.950838), (-23.701614, 10.851544))
            Line((-23.701614, 10.851544), (-20.230141, 9.101117))
            ThreePointArc((-20.230141, 9.101117), (-19.986776, 8.829374), (-19.992776, 8.464635))
        make_face()
        with BuildLine():
            ThreePointArc((-13.096825, 21.071319), (-13.201266, 21.771612), (-13.5055, 22.410955))
            ThreePointArc((-13.5055, 22.410955), (-16.927284, 22.998438), (-17.355598, 19.553109))
            ThreePointArc((-17.355598, 19.553109), (-14.690926, 18.810672), (-13.096825, 21.071319))
        make_face()
        with BuildLine():
            ThreePointArc((-14.687381, -16.181076), (-14.353734, -16.033595), (-14.008701, -16.152012))
            ThreePointArc((-14.008701, -16.152012), (-15.926312, -14.308225), (-17.602142, -12.242219))
            ThreePointArc((-17.602142, -12.242219), (-17.513189, -12.595995), (-17.688231, -12.916044))
            Line((-17.688231, -12.916044), (-20.669516, -15.41145))
            ThreePointArc((-20.669516, -15.41145), (-18.113459, -15.077317), (-16.729068, -17.251837))
            ThreePointArc((-16.729068, -17.251837), (-16.909829, -18.165606), (-17.42488, -18.941731))
            Line((-17.42488, -18.941731), (-14.687381, -16.181076))
        make_face()
        with BuildLine():
            ThreePointArc((-12.507661, -22.438062), (-11.305544, -25.695156), (-8.107644, -24.343421))
            ThreePointArc((-8.107644, -24.343421), (-7.991112, -23.925177), (-7.95184, -23.492782))
            ThreePointArc((-7.95184, -23.492782), (-9.810532, -21.154624), (-12.507661, -22.438062))
        make_face()
        with BuildLine():
            ThreePointArc((-21.600707, -0.350918), (-21.513639, 2.30788), (-21.099646, 4.935692))
            ThreePointArc((-21.099646, 4.935692), (-21.303032, 4.632864), (-21.658, 4.548791))
            Line((-21.658, 4.548791), (-25.507318, 5.094565))
            ThreePointArc((-25.507318, 5.094565), (-24.031968, 4.291768), (-23.444231, 2.718331))
            ThreePointArc((-23.444231, 2.718331), (-24.188518, 0.980915), (-25.959742, 0.321112))
            Line((-25.959742, 0.321112), (-22.076432, 0.133992))
            ThreePointArc((-22.076432, 0.133992), (-21.743579, -0.015271), (-21.600707, -0.350918))
        make_face()
        with BuildLine():
            ThreePointArc((-20.221052, 12.994529), (-20.521256, 14.156793), (-21.346765, 15.028293))
            ThreePointArc((-21.346765, 15.028293), (-24.711671, 14.17322), (-23.701614, 10.851544))
            ThreePointArc((-23.701614, 10.851544), (-21.362749, 10.950838), (-20.221052, 12.994529))
        make_face()
        with BuildLine():
            ThreePointArc((-20.115844, -8.808838), (-19.751057, -8.809813), (-19.484017, -9.05833))
            ThreePointArc((-19.484017, -9.05833), (-20.485906, -6.593984), (-21.176533, -4.024972))
            ThreePointArc((-21.176533, -4.024972), (-21.239164, -4.384344), (-21.529248, -4.605526))
            Line((-21.529248, -4.605526), (-25.267761, -5.672596))
            ThreePointArc((-25.267761, -5.672596), (-23.16352, -6.064585), (-22.209045, -7.980429))
            ThreePointArc((-22.209045, -7.980429), (-22.628284, -9.335636), (-23.739533, -10.21738))
            Line((-23.739533, -10.21738), (-20.115844, -8.808838))
        make_face()
        with BuildLine():
            ThreePointArc((-20.669516, -15.41145), (-20.896106, -18.875899), (-17.42488, -18.941731))
            ThreePointArc((-17.42488, -18.941731), (-16.909829, -18.165606), (-16.729068, -17.251837))
            ThreePointArc((-16.729068, -17.251837), (-18.113459, -15.077317), (-20.669516, -15.41145))
        make_face()
        with BuildLine():
            ThreePointArc((-23.444231, 2.718331), (-24.031968, 4.291768), (-25.507318, 5.094565))
            ThreePointArc((-25.507318, 5.094565), (-28.233523, 2.944786), (-25.959742, 0.321112))
            ThreePointArc((-25.959742, 0.321112), (-24.188518, 0.980915), (-23.444231, 2.718331))
        make_face()
        with BuildLine():
            ThreePointArc((-25.267761, -5.672596), (-26.88388, -8.745364), (-23.739533, -10.21738))
            ThreePointArc((-23.739533, -10.21738), (-22.628284, -9.335636), (-22.209045, -7.980429))
            ThreePointArc((-22.209045, -7.980429), (-23.16352, -6.064585), (-25.267761, -5.672596))
        make_face()
    extrude(amount=F1_DEPTH)


solid = f1.part
